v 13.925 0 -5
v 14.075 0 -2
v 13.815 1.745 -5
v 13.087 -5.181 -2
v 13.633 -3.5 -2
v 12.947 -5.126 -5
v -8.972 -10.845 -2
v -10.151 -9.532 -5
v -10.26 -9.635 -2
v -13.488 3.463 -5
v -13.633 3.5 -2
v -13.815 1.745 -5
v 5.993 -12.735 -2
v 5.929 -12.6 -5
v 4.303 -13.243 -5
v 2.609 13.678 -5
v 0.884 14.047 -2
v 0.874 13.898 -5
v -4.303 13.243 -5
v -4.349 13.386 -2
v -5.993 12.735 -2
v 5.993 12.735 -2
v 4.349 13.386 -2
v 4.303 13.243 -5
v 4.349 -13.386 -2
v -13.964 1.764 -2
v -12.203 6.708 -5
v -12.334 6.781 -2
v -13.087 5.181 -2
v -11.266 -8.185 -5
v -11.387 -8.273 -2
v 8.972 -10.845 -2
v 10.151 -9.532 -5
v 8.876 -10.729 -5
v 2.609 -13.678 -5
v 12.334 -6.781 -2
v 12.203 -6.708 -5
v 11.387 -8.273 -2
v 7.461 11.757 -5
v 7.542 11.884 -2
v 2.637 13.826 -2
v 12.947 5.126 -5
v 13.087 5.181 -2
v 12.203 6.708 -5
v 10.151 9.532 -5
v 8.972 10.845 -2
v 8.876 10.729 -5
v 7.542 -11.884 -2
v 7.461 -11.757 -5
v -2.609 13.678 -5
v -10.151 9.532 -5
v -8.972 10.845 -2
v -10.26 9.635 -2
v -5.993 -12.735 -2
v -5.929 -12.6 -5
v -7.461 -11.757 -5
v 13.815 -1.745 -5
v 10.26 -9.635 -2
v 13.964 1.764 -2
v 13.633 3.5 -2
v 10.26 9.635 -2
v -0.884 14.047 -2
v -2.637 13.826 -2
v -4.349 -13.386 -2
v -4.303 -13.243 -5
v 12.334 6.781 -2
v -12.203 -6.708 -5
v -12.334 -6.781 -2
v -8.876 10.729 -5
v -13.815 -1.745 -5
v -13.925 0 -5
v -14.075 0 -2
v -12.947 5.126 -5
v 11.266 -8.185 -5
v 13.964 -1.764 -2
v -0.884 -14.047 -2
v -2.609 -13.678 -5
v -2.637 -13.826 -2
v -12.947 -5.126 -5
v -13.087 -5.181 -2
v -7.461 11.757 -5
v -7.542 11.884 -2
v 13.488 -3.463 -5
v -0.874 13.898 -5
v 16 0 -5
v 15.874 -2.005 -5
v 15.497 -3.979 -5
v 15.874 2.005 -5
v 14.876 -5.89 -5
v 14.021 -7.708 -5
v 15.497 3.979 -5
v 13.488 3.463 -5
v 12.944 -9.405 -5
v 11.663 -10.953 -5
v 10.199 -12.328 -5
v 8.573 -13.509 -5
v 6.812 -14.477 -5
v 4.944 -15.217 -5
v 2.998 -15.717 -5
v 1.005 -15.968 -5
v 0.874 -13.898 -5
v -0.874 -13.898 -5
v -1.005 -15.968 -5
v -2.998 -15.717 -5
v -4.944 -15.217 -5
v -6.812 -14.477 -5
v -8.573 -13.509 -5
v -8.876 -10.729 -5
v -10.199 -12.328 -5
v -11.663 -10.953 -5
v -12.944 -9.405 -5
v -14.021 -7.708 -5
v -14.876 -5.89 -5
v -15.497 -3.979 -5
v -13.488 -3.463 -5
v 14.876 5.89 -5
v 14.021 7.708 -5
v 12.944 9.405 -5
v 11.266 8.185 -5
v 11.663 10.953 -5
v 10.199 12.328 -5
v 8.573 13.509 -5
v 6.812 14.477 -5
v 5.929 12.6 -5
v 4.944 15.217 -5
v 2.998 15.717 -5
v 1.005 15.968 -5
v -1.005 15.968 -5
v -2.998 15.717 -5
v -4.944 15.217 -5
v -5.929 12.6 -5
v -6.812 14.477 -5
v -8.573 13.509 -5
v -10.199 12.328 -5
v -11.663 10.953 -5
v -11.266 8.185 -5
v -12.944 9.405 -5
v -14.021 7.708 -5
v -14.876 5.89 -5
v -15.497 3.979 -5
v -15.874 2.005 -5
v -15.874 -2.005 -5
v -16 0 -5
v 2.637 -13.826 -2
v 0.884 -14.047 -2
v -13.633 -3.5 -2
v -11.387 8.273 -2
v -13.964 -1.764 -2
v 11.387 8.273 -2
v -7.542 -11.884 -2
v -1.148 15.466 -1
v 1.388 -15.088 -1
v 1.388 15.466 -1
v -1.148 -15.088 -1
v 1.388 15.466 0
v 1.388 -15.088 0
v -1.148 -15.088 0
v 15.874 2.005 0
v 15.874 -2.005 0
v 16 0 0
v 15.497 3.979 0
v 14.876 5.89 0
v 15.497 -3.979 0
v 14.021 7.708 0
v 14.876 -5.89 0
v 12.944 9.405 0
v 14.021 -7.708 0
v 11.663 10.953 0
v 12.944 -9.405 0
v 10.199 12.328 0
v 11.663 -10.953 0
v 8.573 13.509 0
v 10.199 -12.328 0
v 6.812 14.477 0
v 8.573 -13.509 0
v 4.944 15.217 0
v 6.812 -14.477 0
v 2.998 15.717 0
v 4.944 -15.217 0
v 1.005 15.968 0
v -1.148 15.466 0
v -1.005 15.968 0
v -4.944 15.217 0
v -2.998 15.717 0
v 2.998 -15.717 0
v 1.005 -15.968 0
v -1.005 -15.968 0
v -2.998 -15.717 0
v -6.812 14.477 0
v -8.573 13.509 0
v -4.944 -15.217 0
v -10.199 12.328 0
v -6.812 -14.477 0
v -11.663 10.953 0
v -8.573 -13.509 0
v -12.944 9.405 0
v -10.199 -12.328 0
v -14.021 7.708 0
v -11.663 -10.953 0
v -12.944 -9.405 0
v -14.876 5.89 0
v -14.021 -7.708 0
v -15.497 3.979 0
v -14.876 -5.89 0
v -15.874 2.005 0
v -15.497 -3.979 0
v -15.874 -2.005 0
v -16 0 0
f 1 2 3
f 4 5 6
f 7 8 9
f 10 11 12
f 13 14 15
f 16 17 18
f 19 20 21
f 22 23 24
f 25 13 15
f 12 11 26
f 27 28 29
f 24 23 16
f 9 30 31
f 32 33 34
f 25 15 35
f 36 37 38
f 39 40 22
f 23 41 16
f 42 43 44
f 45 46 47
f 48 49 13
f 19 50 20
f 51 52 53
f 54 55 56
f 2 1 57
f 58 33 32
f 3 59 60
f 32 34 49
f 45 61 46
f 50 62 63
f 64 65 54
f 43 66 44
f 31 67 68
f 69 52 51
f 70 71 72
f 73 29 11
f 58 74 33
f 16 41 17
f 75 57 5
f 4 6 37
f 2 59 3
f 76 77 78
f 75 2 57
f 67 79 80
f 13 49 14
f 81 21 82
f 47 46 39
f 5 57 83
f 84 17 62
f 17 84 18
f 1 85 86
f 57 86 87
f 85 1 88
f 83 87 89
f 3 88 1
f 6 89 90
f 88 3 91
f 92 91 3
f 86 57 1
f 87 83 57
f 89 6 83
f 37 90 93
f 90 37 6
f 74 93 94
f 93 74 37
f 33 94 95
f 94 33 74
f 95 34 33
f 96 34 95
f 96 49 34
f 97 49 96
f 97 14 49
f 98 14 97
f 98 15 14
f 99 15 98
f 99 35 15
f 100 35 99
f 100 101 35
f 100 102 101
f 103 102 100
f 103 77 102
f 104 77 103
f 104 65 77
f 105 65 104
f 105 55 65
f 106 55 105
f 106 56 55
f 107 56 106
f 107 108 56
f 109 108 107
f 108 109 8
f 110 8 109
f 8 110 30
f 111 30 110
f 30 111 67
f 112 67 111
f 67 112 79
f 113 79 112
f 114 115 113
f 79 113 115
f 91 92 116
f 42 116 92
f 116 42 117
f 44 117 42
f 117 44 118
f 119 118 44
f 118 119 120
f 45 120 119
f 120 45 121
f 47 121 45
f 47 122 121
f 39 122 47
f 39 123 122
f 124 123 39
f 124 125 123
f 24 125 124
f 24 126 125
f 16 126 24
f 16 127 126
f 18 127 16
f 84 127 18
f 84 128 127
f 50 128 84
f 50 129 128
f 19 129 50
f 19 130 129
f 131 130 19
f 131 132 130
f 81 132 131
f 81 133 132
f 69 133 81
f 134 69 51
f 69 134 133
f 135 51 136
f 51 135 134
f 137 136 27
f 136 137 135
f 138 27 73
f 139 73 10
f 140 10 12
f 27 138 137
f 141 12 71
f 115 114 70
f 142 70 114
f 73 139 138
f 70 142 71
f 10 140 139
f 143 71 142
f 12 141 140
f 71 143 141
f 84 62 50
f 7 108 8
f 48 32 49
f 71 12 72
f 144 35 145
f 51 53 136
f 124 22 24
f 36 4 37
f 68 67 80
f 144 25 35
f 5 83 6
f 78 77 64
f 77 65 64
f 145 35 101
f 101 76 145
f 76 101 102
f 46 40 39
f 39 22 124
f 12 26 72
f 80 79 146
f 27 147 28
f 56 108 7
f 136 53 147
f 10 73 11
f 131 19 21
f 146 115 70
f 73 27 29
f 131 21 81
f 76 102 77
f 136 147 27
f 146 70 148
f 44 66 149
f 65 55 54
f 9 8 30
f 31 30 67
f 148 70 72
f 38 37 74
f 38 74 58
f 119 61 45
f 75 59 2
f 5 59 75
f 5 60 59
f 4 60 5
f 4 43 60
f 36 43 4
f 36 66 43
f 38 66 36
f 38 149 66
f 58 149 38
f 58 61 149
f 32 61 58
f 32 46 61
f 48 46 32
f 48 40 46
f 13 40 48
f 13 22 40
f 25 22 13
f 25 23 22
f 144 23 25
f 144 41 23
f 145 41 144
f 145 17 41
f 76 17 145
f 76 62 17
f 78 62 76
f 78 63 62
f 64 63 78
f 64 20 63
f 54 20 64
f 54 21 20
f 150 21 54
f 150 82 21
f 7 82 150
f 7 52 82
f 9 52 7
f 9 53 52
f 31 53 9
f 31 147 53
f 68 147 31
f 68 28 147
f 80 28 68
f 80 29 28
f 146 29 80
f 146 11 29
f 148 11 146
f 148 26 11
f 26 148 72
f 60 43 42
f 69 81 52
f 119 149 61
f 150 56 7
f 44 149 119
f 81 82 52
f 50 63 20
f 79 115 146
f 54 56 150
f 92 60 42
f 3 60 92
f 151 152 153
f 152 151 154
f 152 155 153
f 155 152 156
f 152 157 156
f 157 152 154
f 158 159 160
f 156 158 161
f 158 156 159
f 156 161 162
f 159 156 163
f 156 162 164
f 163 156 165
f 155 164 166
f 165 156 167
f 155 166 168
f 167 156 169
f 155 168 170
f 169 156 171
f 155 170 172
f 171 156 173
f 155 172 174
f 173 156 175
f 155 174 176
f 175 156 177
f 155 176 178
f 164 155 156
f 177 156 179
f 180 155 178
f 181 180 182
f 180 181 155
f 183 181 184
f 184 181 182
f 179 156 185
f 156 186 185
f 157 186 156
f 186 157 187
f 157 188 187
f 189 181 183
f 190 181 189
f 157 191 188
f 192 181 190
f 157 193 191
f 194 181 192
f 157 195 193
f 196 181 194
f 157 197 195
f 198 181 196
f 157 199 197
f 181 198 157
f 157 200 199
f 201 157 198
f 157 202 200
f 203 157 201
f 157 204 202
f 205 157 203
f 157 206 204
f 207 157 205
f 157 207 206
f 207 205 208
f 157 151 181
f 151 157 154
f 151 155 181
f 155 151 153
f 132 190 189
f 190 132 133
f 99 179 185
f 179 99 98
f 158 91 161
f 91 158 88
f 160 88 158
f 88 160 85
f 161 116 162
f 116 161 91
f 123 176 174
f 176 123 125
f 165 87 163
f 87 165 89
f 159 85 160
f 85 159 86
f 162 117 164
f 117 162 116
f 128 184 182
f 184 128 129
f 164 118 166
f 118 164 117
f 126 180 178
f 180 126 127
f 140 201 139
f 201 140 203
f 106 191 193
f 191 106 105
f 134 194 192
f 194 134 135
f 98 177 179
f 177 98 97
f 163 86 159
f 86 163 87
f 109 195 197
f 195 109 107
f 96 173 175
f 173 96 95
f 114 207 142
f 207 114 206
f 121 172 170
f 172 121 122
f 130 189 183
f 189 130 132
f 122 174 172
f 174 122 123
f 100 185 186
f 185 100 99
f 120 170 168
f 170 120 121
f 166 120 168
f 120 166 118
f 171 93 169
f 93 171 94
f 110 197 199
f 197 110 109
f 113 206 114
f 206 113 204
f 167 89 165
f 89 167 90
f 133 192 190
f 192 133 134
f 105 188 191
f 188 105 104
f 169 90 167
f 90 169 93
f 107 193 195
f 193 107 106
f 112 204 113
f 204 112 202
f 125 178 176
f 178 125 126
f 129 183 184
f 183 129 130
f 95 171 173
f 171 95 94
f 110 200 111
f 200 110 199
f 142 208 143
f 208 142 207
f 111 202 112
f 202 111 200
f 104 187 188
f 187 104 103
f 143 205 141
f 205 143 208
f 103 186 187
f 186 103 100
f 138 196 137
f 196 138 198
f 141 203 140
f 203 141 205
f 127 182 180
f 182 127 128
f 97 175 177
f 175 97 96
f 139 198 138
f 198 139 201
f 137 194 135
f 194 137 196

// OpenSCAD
$fn = 50;


difference() {
	union() {
		translate(v = [0, 0, -5.0000000000]) {
			cylinder(h = 5, r = 16.0000000000);
		}
	}
	union() {
		#translate(v = [0, 0, -5.0000000000]) {
			cylinder(h = 3, r1 = 13.9250000000, r2 = 14.0750000000);
		}
		translate(v = [0, 0, -1]) {
			linear_extrude(height = 1) {
				text(font = "Wingdings", halign = "center", size = 22, text = "|", valign = "center");
			}
		}
	}
}
